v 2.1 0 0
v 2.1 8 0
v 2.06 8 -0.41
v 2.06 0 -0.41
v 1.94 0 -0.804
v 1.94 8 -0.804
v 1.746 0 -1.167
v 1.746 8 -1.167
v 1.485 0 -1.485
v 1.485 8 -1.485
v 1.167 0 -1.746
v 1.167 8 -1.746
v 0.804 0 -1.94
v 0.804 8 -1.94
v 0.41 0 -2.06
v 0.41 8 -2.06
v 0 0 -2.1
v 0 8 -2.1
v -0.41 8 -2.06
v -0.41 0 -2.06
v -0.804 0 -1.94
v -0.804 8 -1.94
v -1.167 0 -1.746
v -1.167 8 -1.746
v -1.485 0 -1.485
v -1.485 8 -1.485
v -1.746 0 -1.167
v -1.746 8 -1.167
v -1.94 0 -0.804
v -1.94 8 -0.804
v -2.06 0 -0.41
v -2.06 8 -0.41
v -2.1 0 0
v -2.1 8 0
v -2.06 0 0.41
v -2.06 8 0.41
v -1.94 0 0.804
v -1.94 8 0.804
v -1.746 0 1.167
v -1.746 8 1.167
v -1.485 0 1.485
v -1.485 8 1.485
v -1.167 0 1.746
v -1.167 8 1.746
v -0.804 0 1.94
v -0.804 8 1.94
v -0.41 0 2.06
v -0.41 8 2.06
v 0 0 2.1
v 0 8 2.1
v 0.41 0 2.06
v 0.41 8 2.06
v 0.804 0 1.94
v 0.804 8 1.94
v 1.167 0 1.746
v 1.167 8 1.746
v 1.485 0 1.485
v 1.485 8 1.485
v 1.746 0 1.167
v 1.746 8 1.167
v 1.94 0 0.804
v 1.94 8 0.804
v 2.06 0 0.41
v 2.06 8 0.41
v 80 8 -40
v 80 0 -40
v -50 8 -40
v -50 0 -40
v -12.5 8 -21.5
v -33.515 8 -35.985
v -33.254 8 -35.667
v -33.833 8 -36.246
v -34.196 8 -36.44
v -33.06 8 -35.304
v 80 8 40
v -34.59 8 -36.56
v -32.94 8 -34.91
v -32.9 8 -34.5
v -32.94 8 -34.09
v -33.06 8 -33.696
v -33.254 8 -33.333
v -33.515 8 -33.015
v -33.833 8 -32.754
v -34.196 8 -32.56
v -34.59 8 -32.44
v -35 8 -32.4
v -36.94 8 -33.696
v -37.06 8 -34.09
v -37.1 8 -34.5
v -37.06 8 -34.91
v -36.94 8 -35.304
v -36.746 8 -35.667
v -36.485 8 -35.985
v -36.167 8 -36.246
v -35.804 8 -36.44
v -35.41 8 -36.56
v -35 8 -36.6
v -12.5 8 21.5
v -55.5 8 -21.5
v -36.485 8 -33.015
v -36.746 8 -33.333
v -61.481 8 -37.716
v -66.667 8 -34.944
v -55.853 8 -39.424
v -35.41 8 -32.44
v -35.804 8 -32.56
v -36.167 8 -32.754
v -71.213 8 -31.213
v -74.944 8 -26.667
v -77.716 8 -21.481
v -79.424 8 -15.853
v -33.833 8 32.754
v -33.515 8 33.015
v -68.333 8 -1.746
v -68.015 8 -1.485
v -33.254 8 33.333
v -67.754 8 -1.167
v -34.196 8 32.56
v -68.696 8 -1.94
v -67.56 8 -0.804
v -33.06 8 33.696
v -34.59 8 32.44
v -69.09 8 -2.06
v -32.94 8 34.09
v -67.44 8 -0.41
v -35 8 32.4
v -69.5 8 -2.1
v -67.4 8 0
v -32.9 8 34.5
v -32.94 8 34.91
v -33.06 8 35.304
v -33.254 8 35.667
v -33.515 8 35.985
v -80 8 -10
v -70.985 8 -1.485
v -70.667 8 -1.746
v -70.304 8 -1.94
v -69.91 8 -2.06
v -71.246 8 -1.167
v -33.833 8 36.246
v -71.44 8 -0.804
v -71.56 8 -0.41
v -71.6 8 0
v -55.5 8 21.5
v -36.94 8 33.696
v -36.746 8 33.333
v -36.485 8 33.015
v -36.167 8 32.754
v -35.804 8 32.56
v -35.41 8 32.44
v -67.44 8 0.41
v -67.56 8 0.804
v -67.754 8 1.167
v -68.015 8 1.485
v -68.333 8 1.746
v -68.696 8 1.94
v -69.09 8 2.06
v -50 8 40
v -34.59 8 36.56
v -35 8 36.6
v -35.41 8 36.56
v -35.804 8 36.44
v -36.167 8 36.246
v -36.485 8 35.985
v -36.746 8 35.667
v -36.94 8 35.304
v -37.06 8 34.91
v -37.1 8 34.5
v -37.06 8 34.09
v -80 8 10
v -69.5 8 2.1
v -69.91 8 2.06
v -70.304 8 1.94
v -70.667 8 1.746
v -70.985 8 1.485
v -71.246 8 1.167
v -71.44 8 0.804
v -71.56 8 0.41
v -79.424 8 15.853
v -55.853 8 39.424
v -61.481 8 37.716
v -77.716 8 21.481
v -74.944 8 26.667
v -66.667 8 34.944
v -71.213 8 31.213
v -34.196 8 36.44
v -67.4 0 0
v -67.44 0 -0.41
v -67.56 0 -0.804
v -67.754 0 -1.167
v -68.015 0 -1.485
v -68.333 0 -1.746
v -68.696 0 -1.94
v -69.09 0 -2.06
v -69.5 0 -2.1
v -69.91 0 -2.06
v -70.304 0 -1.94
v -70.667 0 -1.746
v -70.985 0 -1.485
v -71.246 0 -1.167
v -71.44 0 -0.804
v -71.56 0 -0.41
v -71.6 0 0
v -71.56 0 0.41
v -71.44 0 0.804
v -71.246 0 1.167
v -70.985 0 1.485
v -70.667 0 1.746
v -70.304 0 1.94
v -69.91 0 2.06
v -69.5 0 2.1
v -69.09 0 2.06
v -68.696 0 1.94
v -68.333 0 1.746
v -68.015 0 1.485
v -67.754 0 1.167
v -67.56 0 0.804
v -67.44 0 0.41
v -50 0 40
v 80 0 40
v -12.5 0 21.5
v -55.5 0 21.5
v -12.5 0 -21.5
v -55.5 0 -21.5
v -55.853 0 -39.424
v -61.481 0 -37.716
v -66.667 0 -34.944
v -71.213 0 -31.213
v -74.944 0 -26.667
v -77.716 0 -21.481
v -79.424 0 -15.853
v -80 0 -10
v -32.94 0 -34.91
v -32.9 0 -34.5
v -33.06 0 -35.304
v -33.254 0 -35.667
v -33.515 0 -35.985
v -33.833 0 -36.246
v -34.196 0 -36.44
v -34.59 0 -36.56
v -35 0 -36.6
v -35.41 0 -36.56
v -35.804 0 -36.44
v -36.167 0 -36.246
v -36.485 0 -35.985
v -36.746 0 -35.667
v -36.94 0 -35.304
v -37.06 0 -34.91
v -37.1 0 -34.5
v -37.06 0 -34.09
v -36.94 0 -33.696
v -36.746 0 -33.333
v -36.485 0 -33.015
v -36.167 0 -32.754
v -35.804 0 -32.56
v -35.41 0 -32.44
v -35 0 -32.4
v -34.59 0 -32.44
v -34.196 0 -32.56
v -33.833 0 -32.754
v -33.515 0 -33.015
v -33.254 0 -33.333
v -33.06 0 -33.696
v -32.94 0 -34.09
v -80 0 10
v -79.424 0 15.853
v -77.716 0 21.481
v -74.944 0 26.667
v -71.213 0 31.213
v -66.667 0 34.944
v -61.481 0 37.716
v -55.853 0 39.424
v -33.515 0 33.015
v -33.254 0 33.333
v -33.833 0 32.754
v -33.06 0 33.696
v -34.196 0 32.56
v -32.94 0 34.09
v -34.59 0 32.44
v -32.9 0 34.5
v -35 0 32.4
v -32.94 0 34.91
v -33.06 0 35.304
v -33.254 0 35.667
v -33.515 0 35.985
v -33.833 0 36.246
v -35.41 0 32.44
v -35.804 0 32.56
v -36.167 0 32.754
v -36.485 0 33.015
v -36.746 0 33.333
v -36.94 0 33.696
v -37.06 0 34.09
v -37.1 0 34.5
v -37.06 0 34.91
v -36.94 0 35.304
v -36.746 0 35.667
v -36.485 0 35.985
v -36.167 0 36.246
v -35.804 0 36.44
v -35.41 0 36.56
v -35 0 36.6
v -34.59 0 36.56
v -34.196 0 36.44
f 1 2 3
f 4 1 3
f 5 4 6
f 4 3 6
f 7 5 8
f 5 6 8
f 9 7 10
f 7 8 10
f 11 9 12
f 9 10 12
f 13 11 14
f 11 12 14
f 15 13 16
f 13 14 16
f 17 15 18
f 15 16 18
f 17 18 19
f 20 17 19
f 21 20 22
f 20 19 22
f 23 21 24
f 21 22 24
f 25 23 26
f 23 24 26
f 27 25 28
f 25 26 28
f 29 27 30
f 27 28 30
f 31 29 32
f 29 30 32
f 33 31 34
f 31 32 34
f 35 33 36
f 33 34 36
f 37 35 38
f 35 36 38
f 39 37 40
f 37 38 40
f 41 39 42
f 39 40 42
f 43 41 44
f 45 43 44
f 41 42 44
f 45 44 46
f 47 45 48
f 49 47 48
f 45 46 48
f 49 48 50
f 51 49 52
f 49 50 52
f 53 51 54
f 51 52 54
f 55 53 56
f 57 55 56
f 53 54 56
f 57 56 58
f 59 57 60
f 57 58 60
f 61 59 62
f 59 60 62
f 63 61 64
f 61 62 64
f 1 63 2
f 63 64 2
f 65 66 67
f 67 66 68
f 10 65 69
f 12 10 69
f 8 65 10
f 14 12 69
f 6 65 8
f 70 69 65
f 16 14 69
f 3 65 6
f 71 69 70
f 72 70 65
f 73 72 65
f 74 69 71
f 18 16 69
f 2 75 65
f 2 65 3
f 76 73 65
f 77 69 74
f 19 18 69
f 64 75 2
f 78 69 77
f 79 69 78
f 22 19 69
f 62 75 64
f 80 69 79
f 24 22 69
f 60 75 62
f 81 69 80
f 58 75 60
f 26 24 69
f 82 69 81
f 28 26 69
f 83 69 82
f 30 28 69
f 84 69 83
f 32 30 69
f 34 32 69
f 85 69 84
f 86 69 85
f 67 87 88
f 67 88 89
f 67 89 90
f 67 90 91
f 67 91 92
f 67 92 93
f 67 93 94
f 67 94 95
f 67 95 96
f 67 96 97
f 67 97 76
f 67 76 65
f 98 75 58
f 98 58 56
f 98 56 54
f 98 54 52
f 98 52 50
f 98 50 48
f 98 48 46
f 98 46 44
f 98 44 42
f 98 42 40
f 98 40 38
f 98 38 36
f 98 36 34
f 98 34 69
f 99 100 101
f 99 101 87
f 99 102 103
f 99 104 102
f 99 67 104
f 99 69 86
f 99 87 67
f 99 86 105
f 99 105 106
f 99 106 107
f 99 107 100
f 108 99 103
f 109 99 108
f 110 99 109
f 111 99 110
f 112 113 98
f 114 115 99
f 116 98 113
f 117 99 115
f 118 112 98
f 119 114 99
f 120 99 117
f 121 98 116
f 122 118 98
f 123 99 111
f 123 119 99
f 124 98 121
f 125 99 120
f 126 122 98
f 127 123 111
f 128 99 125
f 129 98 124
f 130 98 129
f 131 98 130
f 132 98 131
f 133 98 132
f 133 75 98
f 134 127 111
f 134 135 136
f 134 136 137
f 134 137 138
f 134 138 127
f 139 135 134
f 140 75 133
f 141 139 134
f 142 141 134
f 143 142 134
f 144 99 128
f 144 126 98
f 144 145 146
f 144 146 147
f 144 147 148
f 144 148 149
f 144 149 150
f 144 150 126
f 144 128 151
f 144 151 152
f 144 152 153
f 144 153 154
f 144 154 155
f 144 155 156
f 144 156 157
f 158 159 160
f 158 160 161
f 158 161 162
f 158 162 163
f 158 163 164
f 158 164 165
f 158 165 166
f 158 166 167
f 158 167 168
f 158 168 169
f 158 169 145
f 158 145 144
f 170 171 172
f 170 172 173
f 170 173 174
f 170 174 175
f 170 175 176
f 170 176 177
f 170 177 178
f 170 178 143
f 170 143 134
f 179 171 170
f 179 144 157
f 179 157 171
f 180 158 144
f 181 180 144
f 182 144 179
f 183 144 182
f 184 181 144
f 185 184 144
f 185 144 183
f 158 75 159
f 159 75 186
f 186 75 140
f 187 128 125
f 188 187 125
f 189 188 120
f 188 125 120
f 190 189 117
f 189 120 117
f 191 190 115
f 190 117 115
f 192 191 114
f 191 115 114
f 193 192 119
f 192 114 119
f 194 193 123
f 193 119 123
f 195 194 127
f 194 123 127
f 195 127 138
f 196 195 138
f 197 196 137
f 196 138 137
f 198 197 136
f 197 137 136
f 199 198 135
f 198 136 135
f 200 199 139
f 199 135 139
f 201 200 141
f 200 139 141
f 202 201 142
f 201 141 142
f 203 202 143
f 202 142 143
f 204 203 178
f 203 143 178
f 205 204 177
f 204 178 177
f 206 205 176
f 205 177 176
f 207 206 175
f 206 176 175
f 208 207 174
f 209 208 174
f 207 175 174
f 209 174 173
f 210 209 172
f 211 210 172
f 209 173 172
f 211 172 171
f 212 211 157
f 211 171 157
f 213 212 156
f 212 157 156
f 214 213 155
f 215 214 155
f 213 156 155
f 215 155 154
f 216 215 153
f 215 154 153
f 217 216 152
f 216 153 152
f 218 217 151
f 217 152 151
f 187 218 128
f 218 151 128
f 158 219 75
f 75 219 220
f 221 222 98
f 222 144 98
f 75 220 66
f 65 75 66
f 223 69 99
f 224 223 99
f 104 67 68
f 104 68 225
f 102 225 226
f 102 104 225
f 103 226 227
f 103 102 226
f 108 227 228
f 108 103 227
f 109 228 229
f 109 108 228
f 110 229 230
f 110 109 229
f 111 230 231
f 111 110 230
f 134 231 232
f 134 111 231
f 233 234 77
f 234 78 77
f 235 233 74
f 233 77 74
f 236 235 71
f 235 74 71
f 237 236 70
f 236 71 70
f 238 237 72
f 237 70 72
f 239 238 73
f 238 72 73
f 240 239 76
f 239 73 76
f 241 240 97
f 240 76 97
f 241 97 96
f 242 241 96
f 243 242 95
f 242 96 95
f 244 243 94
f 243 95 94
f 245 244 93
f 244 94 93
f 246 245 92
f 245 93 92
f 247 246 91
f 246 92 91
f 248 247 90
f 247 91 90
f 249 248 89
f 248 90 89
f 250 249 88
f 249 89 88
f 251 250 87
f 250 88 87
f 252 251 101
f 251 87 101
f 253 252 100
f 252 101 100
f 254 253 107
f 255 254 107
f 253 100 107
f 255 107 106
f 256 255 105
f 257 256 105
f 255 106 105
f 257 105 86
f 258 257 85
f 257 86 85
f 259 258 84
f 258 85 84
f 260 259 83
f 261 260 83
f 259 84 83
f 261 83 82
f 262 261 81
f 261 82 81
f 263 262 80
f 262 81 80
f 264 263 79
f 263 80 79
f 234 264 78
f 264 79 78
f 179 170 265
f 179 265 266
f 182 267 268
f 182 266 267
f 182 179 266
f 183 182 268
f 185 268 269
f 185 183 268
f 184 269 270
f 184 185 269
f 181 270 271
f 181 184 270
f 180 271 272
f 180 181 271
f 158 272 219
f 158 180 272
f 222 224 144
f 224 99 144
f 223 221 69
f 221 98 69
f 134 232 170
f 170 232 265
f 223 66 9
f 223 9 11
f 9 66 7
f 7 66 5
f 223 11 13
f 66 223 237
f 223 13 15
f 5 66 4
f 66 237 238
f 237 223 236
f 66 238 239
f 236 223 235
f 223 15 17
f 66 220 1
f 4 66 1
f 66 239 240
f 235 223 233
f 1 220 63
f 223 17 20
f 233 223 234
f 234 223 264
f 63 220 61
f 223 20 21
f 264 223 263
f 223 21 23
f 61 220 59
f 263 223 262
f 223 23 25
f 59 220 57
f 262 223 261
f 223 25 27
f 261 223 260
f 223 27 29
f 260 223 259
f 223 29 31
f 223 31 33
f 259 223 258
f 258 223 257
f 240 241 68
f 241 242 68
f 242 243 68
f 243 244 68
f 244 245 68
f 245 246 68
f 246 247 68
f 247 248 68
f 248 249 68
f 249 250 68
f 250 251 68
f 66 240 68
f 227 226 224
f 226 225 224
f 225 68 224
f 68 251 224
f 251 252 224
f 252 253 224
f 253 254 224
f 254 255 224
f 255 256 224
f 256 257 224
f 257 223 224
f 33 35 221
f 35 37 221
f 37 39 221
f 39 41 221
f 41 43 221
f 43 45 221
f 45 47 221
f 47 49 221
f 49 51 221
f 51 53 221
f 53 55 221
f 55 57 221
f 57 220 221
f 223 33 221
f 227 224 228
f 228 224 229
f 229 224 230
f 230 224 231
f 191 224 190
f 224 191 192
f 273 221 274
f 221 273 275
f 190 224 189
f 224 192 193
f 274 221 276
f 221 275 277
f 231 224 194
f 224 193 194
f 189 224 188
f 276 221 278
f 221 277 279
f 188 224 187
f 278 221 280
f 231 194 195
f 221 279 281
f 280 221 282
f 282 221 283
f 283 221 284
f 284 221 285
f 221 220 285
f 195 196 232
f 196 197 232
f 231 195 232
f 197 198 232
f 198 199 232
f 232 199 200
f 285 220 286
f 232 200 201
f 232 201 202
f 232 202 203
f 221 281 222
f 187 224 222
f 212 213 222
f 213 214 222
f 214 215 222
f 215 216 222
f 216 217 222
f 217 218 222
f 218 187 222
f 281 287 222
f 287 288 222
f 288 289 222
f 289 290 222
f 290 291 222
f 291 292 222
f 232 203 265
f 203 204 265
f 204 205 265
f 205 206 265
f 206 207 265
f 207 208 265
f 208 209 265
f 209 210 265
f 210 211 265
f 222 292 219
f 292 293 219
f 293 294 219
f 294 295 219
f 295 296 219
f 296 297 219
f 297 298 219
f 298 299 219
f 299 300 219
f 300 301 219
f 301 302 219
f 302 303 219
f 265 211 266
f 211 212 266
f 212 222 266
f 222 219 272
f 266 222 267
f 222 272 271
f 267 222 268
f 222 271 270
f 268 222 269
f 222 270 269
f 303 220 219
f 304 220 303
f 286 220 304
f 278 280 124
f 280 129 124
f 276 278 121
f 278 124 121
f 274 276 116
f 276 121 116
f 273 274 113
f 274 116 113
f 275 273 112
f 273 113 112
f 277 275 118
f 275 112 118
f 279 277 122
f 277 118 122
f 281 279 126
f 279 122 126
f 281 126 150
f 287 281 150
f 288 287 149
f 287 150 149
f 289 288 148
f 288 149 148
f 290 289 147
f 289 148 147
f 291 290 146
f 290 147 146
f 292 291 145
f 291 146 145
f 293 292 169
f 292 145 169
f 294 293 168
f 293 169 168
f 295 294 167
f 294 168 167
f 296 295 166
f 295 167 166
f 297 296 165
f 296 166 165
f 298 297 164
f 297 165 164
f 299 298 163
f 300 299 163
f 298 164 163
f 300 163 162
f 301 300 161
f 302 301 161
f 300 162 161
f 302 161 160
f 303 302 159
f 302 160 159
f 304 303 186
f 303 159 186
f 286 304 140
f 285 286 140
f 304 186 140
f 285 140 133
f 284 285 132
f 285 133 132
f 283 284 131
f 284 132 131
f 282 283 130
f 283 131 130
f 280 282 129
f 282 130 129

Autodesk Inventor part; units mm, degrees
ref_plane "YZ Plane" through (0, 0, 0) normal (1, 0, 0) x (0, 1, 0)
ref_plane "XZ Plane" through (0, 0, 0) normal (0, 1, 0) x (-1, 0, 0)
ref_plane "XY Plane" through (0, 0, 0) normal (0, 0, 1) x (1, 0, 0)
sketch "スケッチ1" plane through (0, 0, 0) normal (0, 1, 0) x (-1, 0, 0)
  line L0 (-80, -40) -> (80, -40)
  line L1 (80, -40) -> (80, 40)
  line L2 (80, 40) -> (-80, 40)
  line L3 (-80, 40) -> (-80, -40)
  line L4 (-80, -40) -> (80, 40) construction
  line L5 (80, -40) -> (-80, 40) construction
  point P0 (0, 0)
  dimension "d0" = 160
  dimension "d1" = 80
extrude "押し出し1" add sketch "スケッチ1" along normal blind 8
sketch "スケッチ2" plane through (0, 8, 0) normal (0, 1, 0) x (1, 0, 0)
  line L0 (-12.5, 21.5) -> (-55.5, 21.5)
  line L1 (-55.5, 21.5) -> (-55.5, -21.5)
  line L2 (-55.5, -21.5) -> (-12.5, -21.5)
  line L3 (-12.5, -21.5) -> (-12.5, 21.5)
  line L4 (-12.5, 21.5) -> (-55.5, -21.5) construction
  line L5 (-55.5, 21.5) -> (-12.5, -21.5) construction
  line L6 (-80, 40) -> (-80, -40) projected
  line L7 (-80, -40) -> (80, -40) projected
  point P0 (0, 0)
  point P1 (-34, 0)
  dimension "d4" = 43
  dimension "d5" = 43
  dimension "d20" = 46
  dimension "d21" = 40
extrude "押し出し2" cut sketch "スケッチ2" against normal blind 8
sketch "スケッチ3" plane through (0, 8, 0) normal (0, 1, 0) x (1, 0, 0)
  circle A0 centre (-35, 0) radius 34.5
  circle A1 centre (-69.5, 0) radius 2.1
  circle A2 centre (-35, 34.5) radius 2.1
  circle A3 centre (0, 0) radius 2.1
  circle A4 centre (-35, -34.5) radius 2.1
  dimension "d8" = 69
  dimension "d9" = 35
  dimension "d10" = 4.2
  dimension "d11" = 4.2
  dimension "d12" = 4.2
  dimension "d13" = 4.2
extrude "押し出し3" cut sketch "スケッチ3" against normal blind 8 contours A0 A3 | A0 A3 | A2 A0 | A0 A2 | A4 A0 | A0 A4 | A1 A0 | A0 A1
fillet "フィレット1" radius 30 1 edges at (-80, 4, 40)
fillet "フィレット2" radius 30 1 edges at (-80, 4, -40)
properties part number "sholder_1" material "アルミニウム 6061"
